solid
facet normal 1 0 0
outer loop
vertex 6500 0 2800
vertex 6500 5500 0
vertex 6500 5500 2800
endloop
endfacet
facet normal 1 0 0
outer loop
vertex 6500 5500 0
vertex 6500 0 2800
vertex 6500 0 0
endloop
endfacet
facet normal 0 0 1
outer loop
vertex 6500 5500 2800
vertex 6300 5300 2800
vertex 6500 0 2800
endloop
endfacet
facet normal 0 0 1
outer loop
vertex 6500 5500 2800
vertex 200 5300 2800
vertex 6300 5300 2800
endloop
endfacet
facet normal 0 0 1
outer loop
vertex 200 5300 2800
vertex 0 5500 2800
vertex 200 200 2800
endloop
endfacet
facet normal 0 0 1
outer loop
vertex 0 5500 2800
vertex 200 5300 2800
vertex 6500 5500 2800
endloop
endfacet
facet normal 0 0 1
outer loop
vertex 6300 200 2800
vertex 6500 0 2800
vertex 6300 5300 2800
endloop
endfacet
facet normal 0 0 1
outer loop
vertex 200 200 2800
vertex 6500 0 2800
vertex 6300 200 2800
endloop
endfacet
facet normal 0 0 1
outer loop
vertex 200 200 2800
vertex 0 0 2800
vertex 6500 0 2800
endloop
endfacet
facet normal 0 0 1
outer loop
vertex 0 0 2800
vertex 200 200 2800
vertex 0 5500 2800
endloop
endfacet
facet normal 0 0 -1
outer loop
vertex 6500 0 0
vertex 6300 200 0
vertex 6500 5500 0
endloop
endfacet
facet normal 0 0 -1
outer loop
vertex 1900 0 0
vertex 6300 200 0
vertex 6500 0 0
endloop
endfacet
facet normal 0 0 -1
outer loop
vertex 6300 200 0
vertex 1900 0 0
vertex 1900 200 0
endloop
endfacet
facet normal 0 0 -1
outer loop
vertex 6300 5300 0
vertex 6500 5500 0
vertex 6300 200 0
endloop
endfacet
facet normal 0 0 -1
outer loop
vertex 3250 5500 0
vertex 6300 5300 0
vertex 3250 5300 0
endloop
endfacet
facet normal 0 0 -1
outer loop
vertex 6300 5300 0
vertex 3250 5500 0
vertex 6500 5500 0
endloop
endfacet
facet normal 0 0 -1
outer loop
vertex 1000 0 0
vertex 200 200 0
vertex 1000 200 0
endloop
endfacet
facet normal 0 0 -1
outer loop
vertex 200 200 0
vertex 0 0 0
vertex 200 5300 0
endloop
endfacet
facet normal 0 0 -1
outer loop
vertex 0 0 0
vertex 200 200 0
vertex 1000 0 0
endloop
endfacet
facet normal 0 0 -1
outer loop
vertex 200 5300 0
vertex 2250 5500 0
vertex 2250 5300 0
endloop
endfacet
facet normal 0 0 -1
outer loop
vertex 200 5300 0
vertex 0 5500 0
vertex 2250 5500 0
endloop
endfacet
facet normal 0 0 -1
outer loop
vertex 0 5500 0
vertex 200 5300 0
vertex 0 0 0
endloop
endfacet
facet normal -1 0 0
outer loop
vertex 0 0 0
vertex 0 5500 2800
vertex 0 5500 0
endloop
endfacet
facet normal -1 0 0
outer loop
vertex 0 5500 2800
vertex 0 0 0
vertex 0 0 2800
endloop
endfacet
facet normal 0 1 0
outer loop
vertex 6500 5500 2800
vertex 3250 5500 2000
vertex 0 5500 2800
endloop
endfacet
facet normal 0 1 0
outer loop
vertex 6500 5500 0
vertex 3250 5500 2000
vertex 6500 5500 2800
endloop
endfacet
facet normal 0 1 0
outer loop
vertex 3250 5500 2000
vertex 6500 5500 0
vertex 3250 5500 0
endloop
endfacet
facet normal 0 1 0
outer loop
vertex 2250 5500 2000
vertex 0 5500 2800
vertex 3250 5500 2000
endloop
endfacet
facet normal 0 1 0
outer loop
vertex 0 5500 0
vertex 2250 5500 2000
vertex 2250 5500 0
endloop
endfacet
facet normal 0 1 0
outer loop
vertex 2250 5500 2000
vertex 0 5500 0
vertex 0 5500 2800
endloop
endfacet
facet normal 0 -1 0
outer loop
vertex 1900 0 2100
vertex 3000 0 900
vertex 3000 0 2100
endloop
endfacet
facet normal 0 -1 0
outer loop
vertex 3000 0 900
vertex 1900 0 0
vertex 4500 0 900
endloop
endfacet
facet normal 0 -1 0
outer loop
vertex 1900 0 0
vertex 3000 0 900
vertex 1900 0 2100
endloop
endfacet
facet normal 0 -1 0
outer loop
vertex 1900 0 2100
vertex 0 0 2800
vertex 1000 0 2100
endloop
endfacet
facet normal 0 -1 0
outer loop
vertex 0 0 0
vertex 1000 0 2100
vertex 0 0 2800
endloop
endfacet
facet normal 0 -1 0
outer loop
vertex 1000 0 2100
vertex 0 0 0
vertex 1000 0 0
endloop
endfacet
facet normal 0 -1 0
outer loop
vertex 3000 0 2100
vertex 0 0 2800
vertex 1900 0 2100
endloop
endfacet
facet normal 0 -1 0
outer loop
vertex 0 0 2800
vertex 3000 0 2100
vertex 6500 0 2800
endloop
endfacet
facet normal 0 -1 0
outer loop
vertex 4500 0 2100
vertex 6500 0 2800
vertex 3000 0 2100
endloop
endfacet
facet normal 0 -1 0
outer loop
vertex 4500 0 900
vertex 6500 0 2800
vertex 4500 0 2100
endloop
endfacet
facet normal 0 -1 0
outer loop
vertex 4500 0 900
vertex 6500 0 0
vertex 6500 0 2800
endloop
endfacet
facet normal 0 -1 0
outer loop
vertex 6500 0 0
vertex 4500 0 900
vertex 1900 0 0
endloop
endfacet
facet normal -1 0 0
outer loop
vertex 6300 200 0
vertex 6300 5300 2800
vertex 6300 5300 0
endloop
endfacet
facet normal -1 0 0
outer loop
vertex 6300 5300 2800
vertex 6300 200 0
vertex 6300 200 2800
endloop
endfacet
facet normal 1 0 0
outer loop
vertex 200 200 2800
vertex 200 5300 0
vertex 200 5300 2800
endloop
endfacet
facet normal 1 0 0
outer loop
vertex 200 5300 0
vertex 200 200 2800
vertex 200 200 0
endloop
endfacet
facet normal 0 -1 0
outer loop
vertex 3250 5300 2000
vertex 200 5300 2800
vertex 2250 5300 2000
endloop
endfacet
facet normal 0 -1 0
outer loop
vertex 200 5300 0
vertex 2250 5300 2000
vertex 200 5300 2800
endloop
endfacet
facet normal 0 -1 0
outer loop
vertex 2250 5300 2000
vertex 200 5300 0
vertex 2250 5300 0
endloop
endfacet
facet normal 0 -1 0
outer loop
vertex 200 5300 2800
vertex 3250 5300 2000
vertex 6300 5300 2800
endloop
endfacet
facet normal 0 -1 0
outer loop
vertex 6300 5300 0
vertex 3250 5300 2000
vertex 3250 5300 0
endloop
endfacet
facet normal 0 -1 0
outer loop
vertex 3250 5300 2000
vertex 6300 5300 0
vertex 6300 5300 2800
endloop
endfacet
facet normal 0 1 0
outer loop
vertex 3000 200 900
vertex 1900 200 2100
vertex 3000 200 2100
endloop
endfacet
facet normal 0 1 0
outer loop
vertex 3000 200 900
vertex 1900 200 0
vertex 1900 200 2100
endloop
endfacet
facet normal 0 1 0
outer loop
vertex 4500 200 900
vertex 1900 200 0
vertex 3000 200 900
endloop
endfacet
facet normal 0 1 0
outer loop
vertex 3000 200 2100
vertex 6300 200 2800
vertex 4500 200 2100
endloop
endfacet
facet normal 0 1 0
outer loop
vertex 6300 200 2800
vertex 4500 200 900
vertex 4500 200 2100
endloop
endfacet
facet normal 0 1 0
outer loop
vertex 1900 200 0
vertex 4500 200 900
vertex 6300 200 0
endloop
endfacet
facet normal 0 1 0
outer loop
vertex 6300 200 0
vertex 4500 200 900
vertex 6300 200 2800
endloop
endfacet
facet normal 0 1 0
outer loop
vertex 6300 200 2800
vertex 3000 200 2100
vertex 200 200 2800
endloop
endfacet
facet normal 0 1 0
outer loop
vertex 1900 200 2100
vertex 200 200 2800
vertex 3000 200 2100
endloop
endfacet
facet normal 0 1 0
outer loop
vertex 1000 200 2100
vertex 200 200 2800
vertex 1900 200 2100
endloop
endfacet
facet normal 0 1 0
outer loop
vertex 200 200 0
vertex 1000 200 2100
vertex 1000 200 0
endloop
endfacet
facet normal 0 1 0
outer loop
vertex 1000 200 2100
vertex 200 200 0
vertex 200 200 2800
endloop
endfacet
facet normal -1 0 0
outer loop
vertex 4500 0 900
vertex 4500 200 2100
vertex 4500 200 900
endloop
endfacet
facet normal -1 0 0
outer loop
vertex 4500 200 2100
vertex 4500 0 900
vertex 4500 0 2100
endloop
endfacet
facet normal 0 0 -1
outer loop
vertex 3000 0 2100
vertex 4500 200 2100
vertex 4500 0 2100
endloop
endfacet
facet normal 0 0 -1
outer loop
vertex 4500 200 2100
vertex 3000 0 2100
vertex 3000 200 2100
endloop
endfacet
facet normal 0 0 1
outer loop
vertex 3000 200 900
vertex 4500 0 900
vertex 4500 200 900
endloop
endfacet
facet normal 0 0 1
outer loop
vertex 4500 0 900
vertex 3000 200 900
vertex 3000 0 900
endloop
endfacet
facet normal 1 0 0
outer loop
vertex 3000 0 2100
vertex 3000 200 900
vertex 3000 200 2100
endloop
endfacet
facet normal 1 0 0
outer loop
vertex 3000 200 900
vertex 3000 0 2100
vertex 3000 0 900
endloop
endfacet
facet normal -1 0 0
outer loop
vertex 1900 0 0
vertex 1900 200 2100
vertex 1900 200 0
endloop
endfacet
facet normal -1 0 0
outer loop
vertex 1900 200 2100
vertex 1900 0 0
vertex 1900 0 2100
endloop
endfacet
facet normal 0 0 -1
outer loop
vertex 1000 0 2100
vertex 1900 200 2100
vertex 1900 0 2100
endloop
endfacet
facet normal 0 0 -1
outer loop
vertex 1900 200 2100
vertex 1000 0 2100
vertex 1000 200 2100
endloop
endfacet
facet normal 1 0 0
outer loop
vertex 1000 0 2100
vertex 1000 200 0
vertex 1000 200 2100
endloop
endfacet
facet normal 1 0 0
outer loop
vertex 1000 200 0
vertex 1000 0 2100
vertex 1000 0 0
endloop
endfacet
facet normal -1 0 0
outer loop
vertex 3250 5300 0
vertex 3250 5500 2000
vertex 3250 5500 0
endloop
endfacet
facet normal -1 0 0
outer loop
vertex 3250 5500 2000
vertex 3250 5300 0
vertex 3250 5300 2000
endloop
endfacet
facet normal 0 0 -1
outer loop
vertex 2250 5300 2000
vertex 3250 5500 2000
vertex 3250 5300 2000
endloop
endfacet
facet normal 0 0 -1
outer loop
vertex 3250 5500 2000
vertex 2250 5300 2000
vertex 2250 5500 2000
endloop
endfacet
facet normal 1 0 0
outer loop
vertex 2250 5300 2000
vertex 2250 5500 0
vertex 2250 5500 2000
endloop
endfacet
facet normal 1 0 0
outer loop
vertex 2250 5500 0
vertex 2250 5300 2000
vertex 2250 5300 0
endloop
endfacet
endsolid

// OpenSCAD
// Concrete 3D Printed Room - Parametric Design
// All measurements in millimeters (mm)

// === ROOM DIMENSIONS ===
room_length = 6500;        // 5 meters
room_width = 5500;         // 4 meters  
wall_height = 2800;        // 2.8 meters (standard ceiling height)
wall_thickness = 200;      // 20 cm (typical concrete 3D print)

// === WINDOW ===
window_width = 1500;       // 1.5 meters wide
window_height = 1200;      // 1.2 meters tall
window_position = 3000;    // 3 meters from left corner
window_sill_height = 900;  // 90 cm from floor

// === DOORS ===
door1_width = 900;         // 0.9 meters wide
door1_height = 2100;       // 2.1 meters tall
door1_position = 1000;     // Position from left corner
door2_width = 1000;         // 1 meter wide
door2_height = 2000;       // 2 meters tall

// === GEOMETRY ===
module room() {
    difference() {
        // Outer walls (solid block)
        cube([room_length, room_width, wall_height]);
        
        // Interior cavity (hollow out the room)
        translate([wall_thickness, wall_thickness, 0])
            cube([
                room_length - 2*wall_thickness,
                room_width - 2*wall_thickness,
                wall_height + 100  // Extra height to ensure clean cut
            ]);
        
        // Window opening (front wall)
        translate([window_position, -10, window_sill_height])
            cube([window_width, wall_thickness + 20, window_height]);
        
        // Door 1 opening (front wall)
        translate([door1_position, -10, 0])
            cube([door1_width, wall_thickness + 20, door1_height]);
        
        // Door 2 opening (back wall)
        translate([room_width/2 - door2_width/2, room_width - wall_thickness - 10, 0])
            cube([door2_width, wall_thickness + 20, door2_height]);
    }
}

// Generate the room
room();
